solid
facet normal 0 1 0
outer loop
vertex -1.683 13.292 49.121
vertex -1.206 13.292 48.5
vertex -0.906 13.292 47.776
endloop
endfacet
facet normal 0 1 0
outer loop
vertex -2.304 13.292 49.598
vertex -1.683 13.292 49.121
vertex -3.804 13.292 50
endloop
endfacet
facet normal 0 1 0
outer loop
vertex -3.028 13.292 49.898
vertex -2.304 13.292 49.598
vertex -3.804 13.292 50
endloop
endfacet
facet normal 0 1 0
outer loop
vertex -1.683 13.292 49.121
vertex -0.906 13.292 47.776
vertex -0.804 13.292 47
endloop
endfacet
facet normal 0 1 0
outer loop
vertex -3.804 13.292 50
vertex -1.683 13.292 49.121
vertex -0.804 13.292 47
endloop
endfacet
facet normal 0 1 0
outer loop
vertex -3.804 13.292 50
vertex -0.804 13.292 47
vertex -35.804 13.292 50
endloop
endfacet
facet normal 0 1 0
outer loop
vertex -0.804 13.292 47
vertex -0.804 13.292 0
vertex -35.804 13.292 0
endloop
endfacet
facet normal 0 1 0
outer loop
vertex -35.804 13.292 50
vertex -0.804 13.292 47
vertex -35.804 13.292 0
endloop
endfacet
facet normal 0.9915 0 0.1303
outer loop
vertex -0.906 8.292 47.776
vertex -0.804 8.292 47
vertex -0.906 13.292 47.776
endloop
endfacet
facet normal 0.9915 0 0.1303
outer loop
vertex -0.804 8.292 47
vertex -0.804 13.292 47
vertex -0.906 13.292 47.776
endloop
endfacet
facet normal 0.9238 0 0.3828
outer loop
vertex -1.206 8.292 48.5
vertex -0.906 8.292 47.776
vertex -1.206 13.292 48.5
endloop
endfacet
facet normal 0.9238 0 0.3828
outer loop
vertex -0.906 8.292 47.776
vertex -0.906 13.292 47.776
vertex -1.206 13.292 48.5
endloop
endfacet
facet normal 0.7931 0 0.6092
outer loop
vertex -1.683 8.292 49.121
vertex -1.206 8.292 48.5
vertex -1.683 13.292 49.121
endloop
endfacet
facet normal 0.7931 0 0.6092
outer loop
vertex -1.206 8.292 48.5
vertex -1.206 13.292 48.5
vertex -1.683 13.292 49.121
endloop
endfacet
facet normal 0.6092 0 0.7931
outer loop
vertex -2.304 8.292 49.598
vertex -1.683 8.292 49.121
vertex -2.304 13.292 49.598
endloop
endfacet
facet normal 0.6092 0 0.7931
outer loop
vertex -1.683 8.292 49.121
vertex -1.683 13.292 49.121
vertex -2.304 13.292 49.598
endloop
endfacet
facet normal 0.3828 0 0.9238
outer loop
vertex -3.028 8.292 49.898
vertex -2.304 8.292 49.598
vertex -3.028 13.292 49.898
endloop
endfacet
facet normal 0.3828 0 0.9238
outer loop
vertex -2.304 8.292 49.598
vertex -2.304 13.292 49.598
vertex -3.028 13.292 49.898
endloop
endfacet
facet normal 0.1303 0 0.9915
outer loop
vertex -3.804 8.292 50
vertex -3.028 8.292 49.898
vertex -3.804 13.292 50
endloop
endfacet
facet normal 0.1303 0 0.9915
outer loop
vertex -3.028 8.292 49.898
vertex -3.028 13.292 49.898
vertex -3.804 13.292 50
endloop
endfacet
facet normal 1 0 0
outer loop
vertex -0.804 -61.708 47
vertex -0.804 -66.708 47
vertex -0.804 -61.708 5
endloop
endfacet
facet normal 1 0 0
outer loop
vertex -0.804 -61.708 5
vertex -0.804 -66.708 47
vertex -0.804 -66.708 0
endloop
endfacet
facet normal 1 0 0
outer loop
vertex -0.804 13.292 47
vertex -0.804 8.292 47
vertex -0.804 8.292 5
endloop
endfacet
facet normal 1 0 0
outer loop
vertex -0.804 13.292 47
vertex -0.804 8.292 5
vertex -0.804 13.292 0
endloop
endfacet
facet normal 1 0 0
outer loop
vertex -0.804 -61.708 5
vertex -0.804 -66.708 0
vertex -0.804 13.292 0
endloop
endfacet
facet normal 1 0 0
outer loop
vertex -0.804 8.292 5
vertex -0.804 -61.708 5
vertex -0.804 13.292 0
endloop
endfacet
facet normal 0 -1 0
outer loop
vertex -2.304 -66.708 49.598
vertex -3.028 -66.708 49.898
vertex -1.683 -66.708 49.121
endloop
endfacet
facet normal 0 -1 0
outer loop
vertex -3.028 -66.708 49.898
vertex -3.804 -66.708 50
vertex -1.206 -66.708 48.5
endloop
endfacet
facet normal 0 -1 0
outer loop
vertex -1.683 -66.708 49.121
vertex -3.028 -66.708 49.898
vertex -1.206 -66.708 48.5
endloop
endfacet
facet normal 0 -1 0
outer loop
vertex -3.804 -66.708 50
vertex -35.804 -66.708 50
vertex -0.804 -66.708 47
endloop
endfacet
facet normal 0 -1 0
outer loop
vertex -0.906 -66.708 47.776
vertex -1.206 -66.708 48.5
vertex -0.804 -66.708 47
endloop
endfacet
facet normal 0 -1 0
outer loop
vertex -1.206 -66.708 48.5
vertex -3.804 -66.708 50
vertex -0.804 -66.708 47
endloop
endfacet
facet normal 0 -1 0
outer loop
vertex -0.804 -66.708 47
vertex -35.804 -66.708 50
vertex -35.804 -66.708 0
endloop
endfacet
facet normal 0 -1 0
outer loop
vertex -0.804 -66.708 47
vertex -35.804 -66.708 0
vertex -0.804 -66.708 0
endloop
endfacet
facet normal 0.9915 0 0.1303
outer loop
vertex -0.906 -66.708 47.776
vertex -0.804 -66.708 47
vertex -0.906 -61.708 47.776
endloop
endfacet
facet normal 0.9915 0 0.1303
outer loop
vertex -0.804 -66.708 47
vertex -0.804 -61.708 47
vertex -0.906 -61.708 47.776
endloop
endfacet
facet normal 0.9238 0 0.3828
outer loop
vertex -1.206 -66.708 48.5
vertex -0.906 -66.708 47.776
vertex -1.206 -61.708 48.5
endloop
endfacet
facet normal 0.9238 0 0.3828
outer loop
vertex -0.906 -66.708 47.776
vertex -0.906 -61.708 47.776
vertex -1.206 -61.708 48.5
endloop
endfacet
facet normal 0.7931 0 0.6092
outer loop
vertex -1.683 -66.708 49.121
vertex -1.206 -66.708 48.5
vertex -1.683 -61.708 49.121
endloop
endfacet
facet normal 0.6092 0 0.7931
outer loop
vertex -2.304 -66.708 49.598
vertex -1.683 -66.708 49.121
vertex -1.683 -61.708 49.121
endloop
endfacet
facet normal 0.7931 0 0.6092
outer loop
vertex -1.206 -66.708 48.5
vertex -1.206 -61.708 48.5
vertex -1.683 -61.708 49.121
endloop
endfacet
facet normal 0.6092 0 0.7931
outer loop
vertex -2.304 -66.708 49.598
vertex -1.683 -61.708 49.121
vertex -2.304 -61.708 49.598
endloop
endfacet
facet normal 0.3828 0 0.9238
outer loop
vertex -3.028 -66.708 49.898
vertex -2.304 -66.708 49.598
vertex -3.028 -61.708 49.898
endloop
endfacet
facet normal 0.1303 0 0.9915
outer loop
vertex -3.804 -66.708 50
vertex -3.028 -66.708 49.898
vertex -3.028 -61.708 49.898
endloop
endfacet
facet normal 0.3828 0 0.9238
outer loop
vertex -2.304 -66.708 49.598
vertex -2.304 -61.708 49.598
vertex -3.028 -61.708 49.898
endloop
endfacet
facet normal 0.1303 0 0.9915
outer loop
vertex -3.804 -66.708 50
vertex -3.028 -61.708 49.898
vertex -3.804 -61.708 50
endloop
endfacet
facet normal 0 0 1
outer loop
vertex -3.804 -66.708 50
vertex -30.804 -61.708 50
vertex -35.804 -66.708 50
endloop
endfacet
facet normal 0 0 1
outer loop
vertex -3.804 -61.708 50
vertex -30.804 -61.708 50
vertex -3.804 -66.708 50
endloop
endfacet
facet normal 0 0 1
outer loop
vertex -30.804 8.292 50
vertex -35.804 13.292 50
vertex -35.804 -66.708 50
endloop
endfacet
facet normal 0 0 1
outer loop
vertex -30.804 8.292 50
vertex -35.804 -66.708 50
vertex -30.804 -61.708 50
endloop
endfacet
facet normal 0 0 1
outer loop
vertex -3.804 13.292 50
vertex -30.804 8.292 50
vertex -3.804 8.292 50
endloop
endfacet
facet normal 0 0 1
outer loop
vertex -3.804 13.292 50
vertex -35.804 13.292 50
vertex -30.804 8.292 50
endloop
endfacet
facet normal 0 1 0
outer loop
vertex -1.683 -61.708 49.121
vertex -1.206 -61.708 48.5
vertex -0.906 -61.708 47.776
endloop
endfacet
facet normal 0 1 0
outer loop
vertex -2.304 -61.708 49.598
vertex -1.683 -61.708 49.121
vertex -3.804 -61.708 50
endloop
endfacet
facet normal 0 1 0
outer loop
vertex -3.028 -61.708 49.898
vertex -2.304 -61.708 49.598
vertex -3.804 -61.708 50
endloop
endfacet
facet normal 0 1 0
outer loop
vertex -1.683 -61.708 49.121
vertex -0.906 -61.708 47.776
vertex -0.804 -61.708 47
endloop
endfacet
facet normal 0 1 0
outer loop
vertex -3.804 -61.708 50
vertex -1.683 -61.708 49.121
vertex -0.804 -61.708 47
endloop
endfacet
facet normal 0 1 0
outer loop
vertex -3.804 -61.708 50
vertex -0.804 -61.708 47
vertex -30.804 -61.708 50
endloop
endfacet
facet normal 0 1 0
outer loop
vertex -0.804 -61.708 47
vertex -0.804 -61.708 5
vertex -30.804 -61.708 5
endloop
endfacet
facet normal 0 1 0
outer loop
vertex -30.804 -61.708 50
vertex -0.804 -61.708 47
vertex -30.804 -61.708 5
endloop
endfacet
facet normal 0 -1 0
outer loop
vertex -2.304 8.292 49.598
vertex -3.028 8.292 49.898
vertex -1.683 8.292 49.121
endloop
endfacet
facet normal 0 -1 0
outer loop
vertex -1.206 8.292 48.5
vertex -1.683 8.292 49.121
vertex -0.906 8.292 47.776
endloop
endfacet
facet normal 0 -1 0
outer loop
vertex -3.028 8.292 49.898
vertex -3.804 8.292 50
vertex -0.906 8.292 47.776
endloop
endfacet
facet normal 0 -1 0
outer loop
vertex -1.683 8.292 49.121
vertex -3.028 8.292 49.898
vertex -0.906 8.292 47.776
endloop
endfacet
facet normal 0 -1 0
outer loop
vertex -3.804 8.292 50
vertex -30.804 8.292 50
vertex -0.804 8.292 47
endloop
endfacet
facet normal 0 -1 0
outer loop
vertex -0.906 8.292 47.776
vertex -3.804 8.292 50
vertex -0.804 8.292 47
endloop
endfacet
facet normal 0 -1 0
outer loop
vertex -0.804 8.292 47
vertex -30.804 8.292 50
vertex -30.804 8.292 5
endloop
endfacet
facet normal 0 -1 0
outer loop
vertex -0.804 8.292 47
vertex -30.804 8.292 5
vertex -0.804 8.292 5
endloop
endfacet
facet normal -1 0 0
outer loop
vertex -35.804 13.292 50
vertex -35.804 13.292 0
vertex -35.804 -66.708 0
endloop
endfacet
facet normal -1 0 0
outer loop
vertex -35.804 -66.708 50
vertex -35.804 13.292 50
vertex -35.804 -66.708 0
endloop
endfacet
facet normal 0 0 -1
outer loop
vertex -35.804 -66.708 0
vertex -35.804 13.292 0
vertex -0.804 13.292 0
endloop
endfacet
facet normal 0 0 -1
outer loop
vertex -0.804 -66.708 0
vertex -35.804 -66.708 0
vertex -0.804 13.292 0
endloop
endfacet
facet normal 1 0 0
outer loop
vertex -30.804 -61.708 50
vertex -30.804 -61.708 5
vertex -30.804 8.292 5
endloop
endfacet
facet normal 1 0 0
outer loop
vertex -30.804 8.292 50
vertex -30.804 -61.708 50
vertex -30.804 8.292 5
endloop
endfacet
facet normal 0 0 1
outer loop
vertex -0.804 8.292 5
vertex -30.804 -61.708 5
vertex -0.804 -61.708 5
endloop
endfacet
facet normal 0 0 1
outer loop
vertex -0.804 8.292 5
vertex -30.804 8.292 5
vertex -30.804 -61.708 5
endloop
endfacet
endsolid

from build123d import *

# Parameters (mm, degrees)
SKETCH_1_W      = 35
SKETCH_1_H      = 80
EXTRUDE_1_DEPTH = 5
EXTRUDE_2_DEPTH = 45
FILLET_1_R      = 3


with BuildPart() as part:
    # 草圖1 → 填料-伸長1 (new body)
    with BuildSketch(Plane.XY):
        with Locations((-18.303993018, -26.708112773)):
            Rectangle(SKETCH_1_W, SKETCH_1_H)
    extrude(amount=EXTRUDE_1_DEPTH)

    # 草圖3 → 填料-伸長2 (add)
    with BuildSketch(Plane.XY.offset(5)):
        Polygon((-35.803993018, 13.291887227), (-35.803993018, -66.708112773), (-0.803993018, -66.708112773), (-0.803993018, -61.708112773), (-30.803993018, -61.708112773), (-30.803993018, 8.291887227), (-0.803993018, 8.291887227), (-0.803993018, 13.291887227), align=None)
    extrude(amount=EXTRUDE_2_DEPTH)

    # 圓角1
    fillet_1_edges = [part.edges().sort_by_distance(p)[0] for p in [
        (-0.803993018, -64.208112773, 50),
        (-0.803993018, 10.791887227, 50),
    ]]
    fillet(fillet_1_edges, radius=FILLET_1_R)


solid = part.part
